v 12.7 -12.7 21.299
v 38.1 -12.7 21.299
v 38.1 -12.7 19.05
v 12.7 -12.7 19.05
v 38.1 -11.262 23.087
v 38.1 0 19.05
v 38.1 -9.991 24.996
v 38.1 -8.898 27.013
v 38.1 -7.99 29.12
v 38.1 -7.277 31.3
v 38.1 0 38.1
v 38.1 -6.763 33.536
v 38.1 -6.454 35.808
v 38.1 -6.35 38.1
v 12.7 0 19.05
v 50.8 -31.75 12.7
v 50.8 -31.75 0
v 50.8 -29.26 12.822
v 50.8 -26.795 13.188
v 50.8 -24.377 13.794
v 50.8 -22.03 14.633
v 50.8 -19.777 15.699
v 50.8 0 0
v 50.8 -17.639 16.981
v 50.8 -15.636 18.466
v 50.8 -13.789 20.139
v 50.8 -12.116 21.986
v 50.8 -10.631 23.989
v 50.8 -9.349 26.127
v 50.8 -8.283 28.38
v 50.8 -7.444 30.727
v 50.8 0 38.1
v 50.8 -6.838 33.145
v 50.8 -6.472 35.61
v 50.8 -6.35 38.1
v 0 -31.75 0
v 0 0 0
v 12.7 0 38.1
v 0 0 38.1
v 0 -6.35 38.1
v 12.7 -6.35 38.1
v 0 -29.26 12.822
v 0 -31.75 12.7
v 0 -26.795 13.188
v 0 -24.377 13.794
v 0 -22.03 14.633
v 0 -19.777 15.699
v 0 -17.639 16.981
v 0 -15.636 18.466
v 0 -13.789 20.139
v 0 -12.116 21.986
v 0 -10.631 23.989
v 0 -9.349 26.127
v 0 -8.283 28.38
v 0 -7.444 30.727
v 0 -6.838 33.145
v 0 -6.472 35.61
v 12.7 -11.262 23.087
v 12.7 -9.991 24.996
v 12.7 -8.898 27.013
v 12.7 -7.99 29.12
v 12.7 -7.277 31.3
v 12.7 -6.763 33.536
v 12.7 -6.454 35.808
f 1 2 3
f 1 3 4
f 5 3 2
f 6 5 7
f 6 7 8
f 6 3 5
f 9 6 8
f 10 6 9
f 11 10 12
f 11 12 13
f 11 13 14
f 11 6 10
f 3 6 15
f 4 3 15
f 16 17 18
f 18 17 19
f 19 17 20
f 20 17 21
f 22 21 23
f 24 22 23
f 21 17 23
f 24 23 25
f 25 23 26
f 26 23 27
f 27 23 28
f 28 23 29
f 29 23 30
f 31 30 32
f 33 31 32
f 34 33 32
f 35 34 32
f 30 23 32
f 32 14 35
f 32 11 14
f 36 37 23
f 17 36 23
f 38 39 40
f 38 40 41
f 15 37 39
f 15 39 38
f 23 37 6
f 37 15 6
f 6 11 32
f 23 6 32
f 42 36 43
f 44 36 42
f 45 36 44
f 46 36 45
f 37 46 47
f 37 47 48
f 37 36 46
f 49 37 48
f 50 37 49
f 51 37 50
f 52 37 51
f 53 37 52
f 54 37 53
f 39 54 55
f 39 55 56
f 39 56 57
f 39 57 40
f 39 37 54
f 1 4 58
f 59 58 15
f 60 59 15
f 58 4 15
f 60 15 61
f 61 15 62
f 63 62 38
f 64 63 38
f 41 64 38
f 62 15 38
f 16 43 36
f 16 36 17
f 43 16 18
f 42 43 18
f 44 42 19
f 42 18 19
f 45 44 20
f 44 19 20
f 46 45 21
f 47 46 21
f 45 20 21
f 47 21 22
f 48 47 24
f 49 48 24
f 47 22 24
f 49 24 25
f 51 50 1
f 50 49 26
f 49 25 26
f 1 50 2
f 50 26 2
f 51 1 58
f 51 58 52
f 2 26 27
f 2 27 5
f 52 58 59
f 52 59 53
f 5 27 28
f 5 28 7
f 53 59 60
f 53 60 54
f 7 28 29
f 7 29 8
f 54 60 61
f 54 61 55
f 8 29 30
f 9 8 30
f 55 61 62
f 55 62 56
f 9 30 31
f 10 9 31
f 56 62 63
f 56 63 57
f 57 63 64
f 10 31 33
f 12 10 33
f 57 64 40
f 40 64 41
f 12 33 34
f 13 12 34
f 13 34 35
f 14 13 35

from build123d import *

# Parameters (mm, degrees)
F0_W     = 50.8
F0_H     = 38.1
F1_DEPTH = 31.75
F2_W     = 25.4
F2_H     = 19.05
F3_DEPTH = 12.7
F5_DEPTH = 50.8


with BuildPart() as f1:
    # F0 (on Front) → F1 (new body)
    with BuildSketch(Plane.XZ):
        with Locations((25.4, 19.05)):
            Rectangle(F0_W, F0_H)
    extrude(amount=F1_DEPTH)

    # F2 (on face) → F3 (cut)
    with BuildSketch(Plane(origin=(0, 0, 0), x_dir=(-1, 0, 0), z_dir=(0, 1, 0))):
        with Locations((-25.4, 28.575)):
            Rectangle(F2_W, F2_H)
    extrude(amount=-F3_DEPTH, mode=Mode.SUBTRACT)

    # F4 (on face) → F5 (cut)
    with BuildSketch(Plane.YZ.offset(50.8)):
        with BuildLine():
            Line((-31.75, 38.1), (-6.35, 38.1))
            ThreePointArc((-6.35, 38.1), (-49.710512, 56.060512), (-31.75, 12.7))
            Line((-31.75, 12.7), (-31.75, 38.1))
        make_face()
        with BuildLine():
            ThreePointArc((-31.75, 12.7), (-13.789488, 20.139488), (-6.35, 38.1))
            Line((-6.35, 38.1), (-31.75, 38.1))
            Line((-31.75, 38.1), (-31.75, 12.7))
        make_face()
    extrude(amount=-F5_DEPTH, mode=Mode.SUBTRACT)


solid = f1.part
